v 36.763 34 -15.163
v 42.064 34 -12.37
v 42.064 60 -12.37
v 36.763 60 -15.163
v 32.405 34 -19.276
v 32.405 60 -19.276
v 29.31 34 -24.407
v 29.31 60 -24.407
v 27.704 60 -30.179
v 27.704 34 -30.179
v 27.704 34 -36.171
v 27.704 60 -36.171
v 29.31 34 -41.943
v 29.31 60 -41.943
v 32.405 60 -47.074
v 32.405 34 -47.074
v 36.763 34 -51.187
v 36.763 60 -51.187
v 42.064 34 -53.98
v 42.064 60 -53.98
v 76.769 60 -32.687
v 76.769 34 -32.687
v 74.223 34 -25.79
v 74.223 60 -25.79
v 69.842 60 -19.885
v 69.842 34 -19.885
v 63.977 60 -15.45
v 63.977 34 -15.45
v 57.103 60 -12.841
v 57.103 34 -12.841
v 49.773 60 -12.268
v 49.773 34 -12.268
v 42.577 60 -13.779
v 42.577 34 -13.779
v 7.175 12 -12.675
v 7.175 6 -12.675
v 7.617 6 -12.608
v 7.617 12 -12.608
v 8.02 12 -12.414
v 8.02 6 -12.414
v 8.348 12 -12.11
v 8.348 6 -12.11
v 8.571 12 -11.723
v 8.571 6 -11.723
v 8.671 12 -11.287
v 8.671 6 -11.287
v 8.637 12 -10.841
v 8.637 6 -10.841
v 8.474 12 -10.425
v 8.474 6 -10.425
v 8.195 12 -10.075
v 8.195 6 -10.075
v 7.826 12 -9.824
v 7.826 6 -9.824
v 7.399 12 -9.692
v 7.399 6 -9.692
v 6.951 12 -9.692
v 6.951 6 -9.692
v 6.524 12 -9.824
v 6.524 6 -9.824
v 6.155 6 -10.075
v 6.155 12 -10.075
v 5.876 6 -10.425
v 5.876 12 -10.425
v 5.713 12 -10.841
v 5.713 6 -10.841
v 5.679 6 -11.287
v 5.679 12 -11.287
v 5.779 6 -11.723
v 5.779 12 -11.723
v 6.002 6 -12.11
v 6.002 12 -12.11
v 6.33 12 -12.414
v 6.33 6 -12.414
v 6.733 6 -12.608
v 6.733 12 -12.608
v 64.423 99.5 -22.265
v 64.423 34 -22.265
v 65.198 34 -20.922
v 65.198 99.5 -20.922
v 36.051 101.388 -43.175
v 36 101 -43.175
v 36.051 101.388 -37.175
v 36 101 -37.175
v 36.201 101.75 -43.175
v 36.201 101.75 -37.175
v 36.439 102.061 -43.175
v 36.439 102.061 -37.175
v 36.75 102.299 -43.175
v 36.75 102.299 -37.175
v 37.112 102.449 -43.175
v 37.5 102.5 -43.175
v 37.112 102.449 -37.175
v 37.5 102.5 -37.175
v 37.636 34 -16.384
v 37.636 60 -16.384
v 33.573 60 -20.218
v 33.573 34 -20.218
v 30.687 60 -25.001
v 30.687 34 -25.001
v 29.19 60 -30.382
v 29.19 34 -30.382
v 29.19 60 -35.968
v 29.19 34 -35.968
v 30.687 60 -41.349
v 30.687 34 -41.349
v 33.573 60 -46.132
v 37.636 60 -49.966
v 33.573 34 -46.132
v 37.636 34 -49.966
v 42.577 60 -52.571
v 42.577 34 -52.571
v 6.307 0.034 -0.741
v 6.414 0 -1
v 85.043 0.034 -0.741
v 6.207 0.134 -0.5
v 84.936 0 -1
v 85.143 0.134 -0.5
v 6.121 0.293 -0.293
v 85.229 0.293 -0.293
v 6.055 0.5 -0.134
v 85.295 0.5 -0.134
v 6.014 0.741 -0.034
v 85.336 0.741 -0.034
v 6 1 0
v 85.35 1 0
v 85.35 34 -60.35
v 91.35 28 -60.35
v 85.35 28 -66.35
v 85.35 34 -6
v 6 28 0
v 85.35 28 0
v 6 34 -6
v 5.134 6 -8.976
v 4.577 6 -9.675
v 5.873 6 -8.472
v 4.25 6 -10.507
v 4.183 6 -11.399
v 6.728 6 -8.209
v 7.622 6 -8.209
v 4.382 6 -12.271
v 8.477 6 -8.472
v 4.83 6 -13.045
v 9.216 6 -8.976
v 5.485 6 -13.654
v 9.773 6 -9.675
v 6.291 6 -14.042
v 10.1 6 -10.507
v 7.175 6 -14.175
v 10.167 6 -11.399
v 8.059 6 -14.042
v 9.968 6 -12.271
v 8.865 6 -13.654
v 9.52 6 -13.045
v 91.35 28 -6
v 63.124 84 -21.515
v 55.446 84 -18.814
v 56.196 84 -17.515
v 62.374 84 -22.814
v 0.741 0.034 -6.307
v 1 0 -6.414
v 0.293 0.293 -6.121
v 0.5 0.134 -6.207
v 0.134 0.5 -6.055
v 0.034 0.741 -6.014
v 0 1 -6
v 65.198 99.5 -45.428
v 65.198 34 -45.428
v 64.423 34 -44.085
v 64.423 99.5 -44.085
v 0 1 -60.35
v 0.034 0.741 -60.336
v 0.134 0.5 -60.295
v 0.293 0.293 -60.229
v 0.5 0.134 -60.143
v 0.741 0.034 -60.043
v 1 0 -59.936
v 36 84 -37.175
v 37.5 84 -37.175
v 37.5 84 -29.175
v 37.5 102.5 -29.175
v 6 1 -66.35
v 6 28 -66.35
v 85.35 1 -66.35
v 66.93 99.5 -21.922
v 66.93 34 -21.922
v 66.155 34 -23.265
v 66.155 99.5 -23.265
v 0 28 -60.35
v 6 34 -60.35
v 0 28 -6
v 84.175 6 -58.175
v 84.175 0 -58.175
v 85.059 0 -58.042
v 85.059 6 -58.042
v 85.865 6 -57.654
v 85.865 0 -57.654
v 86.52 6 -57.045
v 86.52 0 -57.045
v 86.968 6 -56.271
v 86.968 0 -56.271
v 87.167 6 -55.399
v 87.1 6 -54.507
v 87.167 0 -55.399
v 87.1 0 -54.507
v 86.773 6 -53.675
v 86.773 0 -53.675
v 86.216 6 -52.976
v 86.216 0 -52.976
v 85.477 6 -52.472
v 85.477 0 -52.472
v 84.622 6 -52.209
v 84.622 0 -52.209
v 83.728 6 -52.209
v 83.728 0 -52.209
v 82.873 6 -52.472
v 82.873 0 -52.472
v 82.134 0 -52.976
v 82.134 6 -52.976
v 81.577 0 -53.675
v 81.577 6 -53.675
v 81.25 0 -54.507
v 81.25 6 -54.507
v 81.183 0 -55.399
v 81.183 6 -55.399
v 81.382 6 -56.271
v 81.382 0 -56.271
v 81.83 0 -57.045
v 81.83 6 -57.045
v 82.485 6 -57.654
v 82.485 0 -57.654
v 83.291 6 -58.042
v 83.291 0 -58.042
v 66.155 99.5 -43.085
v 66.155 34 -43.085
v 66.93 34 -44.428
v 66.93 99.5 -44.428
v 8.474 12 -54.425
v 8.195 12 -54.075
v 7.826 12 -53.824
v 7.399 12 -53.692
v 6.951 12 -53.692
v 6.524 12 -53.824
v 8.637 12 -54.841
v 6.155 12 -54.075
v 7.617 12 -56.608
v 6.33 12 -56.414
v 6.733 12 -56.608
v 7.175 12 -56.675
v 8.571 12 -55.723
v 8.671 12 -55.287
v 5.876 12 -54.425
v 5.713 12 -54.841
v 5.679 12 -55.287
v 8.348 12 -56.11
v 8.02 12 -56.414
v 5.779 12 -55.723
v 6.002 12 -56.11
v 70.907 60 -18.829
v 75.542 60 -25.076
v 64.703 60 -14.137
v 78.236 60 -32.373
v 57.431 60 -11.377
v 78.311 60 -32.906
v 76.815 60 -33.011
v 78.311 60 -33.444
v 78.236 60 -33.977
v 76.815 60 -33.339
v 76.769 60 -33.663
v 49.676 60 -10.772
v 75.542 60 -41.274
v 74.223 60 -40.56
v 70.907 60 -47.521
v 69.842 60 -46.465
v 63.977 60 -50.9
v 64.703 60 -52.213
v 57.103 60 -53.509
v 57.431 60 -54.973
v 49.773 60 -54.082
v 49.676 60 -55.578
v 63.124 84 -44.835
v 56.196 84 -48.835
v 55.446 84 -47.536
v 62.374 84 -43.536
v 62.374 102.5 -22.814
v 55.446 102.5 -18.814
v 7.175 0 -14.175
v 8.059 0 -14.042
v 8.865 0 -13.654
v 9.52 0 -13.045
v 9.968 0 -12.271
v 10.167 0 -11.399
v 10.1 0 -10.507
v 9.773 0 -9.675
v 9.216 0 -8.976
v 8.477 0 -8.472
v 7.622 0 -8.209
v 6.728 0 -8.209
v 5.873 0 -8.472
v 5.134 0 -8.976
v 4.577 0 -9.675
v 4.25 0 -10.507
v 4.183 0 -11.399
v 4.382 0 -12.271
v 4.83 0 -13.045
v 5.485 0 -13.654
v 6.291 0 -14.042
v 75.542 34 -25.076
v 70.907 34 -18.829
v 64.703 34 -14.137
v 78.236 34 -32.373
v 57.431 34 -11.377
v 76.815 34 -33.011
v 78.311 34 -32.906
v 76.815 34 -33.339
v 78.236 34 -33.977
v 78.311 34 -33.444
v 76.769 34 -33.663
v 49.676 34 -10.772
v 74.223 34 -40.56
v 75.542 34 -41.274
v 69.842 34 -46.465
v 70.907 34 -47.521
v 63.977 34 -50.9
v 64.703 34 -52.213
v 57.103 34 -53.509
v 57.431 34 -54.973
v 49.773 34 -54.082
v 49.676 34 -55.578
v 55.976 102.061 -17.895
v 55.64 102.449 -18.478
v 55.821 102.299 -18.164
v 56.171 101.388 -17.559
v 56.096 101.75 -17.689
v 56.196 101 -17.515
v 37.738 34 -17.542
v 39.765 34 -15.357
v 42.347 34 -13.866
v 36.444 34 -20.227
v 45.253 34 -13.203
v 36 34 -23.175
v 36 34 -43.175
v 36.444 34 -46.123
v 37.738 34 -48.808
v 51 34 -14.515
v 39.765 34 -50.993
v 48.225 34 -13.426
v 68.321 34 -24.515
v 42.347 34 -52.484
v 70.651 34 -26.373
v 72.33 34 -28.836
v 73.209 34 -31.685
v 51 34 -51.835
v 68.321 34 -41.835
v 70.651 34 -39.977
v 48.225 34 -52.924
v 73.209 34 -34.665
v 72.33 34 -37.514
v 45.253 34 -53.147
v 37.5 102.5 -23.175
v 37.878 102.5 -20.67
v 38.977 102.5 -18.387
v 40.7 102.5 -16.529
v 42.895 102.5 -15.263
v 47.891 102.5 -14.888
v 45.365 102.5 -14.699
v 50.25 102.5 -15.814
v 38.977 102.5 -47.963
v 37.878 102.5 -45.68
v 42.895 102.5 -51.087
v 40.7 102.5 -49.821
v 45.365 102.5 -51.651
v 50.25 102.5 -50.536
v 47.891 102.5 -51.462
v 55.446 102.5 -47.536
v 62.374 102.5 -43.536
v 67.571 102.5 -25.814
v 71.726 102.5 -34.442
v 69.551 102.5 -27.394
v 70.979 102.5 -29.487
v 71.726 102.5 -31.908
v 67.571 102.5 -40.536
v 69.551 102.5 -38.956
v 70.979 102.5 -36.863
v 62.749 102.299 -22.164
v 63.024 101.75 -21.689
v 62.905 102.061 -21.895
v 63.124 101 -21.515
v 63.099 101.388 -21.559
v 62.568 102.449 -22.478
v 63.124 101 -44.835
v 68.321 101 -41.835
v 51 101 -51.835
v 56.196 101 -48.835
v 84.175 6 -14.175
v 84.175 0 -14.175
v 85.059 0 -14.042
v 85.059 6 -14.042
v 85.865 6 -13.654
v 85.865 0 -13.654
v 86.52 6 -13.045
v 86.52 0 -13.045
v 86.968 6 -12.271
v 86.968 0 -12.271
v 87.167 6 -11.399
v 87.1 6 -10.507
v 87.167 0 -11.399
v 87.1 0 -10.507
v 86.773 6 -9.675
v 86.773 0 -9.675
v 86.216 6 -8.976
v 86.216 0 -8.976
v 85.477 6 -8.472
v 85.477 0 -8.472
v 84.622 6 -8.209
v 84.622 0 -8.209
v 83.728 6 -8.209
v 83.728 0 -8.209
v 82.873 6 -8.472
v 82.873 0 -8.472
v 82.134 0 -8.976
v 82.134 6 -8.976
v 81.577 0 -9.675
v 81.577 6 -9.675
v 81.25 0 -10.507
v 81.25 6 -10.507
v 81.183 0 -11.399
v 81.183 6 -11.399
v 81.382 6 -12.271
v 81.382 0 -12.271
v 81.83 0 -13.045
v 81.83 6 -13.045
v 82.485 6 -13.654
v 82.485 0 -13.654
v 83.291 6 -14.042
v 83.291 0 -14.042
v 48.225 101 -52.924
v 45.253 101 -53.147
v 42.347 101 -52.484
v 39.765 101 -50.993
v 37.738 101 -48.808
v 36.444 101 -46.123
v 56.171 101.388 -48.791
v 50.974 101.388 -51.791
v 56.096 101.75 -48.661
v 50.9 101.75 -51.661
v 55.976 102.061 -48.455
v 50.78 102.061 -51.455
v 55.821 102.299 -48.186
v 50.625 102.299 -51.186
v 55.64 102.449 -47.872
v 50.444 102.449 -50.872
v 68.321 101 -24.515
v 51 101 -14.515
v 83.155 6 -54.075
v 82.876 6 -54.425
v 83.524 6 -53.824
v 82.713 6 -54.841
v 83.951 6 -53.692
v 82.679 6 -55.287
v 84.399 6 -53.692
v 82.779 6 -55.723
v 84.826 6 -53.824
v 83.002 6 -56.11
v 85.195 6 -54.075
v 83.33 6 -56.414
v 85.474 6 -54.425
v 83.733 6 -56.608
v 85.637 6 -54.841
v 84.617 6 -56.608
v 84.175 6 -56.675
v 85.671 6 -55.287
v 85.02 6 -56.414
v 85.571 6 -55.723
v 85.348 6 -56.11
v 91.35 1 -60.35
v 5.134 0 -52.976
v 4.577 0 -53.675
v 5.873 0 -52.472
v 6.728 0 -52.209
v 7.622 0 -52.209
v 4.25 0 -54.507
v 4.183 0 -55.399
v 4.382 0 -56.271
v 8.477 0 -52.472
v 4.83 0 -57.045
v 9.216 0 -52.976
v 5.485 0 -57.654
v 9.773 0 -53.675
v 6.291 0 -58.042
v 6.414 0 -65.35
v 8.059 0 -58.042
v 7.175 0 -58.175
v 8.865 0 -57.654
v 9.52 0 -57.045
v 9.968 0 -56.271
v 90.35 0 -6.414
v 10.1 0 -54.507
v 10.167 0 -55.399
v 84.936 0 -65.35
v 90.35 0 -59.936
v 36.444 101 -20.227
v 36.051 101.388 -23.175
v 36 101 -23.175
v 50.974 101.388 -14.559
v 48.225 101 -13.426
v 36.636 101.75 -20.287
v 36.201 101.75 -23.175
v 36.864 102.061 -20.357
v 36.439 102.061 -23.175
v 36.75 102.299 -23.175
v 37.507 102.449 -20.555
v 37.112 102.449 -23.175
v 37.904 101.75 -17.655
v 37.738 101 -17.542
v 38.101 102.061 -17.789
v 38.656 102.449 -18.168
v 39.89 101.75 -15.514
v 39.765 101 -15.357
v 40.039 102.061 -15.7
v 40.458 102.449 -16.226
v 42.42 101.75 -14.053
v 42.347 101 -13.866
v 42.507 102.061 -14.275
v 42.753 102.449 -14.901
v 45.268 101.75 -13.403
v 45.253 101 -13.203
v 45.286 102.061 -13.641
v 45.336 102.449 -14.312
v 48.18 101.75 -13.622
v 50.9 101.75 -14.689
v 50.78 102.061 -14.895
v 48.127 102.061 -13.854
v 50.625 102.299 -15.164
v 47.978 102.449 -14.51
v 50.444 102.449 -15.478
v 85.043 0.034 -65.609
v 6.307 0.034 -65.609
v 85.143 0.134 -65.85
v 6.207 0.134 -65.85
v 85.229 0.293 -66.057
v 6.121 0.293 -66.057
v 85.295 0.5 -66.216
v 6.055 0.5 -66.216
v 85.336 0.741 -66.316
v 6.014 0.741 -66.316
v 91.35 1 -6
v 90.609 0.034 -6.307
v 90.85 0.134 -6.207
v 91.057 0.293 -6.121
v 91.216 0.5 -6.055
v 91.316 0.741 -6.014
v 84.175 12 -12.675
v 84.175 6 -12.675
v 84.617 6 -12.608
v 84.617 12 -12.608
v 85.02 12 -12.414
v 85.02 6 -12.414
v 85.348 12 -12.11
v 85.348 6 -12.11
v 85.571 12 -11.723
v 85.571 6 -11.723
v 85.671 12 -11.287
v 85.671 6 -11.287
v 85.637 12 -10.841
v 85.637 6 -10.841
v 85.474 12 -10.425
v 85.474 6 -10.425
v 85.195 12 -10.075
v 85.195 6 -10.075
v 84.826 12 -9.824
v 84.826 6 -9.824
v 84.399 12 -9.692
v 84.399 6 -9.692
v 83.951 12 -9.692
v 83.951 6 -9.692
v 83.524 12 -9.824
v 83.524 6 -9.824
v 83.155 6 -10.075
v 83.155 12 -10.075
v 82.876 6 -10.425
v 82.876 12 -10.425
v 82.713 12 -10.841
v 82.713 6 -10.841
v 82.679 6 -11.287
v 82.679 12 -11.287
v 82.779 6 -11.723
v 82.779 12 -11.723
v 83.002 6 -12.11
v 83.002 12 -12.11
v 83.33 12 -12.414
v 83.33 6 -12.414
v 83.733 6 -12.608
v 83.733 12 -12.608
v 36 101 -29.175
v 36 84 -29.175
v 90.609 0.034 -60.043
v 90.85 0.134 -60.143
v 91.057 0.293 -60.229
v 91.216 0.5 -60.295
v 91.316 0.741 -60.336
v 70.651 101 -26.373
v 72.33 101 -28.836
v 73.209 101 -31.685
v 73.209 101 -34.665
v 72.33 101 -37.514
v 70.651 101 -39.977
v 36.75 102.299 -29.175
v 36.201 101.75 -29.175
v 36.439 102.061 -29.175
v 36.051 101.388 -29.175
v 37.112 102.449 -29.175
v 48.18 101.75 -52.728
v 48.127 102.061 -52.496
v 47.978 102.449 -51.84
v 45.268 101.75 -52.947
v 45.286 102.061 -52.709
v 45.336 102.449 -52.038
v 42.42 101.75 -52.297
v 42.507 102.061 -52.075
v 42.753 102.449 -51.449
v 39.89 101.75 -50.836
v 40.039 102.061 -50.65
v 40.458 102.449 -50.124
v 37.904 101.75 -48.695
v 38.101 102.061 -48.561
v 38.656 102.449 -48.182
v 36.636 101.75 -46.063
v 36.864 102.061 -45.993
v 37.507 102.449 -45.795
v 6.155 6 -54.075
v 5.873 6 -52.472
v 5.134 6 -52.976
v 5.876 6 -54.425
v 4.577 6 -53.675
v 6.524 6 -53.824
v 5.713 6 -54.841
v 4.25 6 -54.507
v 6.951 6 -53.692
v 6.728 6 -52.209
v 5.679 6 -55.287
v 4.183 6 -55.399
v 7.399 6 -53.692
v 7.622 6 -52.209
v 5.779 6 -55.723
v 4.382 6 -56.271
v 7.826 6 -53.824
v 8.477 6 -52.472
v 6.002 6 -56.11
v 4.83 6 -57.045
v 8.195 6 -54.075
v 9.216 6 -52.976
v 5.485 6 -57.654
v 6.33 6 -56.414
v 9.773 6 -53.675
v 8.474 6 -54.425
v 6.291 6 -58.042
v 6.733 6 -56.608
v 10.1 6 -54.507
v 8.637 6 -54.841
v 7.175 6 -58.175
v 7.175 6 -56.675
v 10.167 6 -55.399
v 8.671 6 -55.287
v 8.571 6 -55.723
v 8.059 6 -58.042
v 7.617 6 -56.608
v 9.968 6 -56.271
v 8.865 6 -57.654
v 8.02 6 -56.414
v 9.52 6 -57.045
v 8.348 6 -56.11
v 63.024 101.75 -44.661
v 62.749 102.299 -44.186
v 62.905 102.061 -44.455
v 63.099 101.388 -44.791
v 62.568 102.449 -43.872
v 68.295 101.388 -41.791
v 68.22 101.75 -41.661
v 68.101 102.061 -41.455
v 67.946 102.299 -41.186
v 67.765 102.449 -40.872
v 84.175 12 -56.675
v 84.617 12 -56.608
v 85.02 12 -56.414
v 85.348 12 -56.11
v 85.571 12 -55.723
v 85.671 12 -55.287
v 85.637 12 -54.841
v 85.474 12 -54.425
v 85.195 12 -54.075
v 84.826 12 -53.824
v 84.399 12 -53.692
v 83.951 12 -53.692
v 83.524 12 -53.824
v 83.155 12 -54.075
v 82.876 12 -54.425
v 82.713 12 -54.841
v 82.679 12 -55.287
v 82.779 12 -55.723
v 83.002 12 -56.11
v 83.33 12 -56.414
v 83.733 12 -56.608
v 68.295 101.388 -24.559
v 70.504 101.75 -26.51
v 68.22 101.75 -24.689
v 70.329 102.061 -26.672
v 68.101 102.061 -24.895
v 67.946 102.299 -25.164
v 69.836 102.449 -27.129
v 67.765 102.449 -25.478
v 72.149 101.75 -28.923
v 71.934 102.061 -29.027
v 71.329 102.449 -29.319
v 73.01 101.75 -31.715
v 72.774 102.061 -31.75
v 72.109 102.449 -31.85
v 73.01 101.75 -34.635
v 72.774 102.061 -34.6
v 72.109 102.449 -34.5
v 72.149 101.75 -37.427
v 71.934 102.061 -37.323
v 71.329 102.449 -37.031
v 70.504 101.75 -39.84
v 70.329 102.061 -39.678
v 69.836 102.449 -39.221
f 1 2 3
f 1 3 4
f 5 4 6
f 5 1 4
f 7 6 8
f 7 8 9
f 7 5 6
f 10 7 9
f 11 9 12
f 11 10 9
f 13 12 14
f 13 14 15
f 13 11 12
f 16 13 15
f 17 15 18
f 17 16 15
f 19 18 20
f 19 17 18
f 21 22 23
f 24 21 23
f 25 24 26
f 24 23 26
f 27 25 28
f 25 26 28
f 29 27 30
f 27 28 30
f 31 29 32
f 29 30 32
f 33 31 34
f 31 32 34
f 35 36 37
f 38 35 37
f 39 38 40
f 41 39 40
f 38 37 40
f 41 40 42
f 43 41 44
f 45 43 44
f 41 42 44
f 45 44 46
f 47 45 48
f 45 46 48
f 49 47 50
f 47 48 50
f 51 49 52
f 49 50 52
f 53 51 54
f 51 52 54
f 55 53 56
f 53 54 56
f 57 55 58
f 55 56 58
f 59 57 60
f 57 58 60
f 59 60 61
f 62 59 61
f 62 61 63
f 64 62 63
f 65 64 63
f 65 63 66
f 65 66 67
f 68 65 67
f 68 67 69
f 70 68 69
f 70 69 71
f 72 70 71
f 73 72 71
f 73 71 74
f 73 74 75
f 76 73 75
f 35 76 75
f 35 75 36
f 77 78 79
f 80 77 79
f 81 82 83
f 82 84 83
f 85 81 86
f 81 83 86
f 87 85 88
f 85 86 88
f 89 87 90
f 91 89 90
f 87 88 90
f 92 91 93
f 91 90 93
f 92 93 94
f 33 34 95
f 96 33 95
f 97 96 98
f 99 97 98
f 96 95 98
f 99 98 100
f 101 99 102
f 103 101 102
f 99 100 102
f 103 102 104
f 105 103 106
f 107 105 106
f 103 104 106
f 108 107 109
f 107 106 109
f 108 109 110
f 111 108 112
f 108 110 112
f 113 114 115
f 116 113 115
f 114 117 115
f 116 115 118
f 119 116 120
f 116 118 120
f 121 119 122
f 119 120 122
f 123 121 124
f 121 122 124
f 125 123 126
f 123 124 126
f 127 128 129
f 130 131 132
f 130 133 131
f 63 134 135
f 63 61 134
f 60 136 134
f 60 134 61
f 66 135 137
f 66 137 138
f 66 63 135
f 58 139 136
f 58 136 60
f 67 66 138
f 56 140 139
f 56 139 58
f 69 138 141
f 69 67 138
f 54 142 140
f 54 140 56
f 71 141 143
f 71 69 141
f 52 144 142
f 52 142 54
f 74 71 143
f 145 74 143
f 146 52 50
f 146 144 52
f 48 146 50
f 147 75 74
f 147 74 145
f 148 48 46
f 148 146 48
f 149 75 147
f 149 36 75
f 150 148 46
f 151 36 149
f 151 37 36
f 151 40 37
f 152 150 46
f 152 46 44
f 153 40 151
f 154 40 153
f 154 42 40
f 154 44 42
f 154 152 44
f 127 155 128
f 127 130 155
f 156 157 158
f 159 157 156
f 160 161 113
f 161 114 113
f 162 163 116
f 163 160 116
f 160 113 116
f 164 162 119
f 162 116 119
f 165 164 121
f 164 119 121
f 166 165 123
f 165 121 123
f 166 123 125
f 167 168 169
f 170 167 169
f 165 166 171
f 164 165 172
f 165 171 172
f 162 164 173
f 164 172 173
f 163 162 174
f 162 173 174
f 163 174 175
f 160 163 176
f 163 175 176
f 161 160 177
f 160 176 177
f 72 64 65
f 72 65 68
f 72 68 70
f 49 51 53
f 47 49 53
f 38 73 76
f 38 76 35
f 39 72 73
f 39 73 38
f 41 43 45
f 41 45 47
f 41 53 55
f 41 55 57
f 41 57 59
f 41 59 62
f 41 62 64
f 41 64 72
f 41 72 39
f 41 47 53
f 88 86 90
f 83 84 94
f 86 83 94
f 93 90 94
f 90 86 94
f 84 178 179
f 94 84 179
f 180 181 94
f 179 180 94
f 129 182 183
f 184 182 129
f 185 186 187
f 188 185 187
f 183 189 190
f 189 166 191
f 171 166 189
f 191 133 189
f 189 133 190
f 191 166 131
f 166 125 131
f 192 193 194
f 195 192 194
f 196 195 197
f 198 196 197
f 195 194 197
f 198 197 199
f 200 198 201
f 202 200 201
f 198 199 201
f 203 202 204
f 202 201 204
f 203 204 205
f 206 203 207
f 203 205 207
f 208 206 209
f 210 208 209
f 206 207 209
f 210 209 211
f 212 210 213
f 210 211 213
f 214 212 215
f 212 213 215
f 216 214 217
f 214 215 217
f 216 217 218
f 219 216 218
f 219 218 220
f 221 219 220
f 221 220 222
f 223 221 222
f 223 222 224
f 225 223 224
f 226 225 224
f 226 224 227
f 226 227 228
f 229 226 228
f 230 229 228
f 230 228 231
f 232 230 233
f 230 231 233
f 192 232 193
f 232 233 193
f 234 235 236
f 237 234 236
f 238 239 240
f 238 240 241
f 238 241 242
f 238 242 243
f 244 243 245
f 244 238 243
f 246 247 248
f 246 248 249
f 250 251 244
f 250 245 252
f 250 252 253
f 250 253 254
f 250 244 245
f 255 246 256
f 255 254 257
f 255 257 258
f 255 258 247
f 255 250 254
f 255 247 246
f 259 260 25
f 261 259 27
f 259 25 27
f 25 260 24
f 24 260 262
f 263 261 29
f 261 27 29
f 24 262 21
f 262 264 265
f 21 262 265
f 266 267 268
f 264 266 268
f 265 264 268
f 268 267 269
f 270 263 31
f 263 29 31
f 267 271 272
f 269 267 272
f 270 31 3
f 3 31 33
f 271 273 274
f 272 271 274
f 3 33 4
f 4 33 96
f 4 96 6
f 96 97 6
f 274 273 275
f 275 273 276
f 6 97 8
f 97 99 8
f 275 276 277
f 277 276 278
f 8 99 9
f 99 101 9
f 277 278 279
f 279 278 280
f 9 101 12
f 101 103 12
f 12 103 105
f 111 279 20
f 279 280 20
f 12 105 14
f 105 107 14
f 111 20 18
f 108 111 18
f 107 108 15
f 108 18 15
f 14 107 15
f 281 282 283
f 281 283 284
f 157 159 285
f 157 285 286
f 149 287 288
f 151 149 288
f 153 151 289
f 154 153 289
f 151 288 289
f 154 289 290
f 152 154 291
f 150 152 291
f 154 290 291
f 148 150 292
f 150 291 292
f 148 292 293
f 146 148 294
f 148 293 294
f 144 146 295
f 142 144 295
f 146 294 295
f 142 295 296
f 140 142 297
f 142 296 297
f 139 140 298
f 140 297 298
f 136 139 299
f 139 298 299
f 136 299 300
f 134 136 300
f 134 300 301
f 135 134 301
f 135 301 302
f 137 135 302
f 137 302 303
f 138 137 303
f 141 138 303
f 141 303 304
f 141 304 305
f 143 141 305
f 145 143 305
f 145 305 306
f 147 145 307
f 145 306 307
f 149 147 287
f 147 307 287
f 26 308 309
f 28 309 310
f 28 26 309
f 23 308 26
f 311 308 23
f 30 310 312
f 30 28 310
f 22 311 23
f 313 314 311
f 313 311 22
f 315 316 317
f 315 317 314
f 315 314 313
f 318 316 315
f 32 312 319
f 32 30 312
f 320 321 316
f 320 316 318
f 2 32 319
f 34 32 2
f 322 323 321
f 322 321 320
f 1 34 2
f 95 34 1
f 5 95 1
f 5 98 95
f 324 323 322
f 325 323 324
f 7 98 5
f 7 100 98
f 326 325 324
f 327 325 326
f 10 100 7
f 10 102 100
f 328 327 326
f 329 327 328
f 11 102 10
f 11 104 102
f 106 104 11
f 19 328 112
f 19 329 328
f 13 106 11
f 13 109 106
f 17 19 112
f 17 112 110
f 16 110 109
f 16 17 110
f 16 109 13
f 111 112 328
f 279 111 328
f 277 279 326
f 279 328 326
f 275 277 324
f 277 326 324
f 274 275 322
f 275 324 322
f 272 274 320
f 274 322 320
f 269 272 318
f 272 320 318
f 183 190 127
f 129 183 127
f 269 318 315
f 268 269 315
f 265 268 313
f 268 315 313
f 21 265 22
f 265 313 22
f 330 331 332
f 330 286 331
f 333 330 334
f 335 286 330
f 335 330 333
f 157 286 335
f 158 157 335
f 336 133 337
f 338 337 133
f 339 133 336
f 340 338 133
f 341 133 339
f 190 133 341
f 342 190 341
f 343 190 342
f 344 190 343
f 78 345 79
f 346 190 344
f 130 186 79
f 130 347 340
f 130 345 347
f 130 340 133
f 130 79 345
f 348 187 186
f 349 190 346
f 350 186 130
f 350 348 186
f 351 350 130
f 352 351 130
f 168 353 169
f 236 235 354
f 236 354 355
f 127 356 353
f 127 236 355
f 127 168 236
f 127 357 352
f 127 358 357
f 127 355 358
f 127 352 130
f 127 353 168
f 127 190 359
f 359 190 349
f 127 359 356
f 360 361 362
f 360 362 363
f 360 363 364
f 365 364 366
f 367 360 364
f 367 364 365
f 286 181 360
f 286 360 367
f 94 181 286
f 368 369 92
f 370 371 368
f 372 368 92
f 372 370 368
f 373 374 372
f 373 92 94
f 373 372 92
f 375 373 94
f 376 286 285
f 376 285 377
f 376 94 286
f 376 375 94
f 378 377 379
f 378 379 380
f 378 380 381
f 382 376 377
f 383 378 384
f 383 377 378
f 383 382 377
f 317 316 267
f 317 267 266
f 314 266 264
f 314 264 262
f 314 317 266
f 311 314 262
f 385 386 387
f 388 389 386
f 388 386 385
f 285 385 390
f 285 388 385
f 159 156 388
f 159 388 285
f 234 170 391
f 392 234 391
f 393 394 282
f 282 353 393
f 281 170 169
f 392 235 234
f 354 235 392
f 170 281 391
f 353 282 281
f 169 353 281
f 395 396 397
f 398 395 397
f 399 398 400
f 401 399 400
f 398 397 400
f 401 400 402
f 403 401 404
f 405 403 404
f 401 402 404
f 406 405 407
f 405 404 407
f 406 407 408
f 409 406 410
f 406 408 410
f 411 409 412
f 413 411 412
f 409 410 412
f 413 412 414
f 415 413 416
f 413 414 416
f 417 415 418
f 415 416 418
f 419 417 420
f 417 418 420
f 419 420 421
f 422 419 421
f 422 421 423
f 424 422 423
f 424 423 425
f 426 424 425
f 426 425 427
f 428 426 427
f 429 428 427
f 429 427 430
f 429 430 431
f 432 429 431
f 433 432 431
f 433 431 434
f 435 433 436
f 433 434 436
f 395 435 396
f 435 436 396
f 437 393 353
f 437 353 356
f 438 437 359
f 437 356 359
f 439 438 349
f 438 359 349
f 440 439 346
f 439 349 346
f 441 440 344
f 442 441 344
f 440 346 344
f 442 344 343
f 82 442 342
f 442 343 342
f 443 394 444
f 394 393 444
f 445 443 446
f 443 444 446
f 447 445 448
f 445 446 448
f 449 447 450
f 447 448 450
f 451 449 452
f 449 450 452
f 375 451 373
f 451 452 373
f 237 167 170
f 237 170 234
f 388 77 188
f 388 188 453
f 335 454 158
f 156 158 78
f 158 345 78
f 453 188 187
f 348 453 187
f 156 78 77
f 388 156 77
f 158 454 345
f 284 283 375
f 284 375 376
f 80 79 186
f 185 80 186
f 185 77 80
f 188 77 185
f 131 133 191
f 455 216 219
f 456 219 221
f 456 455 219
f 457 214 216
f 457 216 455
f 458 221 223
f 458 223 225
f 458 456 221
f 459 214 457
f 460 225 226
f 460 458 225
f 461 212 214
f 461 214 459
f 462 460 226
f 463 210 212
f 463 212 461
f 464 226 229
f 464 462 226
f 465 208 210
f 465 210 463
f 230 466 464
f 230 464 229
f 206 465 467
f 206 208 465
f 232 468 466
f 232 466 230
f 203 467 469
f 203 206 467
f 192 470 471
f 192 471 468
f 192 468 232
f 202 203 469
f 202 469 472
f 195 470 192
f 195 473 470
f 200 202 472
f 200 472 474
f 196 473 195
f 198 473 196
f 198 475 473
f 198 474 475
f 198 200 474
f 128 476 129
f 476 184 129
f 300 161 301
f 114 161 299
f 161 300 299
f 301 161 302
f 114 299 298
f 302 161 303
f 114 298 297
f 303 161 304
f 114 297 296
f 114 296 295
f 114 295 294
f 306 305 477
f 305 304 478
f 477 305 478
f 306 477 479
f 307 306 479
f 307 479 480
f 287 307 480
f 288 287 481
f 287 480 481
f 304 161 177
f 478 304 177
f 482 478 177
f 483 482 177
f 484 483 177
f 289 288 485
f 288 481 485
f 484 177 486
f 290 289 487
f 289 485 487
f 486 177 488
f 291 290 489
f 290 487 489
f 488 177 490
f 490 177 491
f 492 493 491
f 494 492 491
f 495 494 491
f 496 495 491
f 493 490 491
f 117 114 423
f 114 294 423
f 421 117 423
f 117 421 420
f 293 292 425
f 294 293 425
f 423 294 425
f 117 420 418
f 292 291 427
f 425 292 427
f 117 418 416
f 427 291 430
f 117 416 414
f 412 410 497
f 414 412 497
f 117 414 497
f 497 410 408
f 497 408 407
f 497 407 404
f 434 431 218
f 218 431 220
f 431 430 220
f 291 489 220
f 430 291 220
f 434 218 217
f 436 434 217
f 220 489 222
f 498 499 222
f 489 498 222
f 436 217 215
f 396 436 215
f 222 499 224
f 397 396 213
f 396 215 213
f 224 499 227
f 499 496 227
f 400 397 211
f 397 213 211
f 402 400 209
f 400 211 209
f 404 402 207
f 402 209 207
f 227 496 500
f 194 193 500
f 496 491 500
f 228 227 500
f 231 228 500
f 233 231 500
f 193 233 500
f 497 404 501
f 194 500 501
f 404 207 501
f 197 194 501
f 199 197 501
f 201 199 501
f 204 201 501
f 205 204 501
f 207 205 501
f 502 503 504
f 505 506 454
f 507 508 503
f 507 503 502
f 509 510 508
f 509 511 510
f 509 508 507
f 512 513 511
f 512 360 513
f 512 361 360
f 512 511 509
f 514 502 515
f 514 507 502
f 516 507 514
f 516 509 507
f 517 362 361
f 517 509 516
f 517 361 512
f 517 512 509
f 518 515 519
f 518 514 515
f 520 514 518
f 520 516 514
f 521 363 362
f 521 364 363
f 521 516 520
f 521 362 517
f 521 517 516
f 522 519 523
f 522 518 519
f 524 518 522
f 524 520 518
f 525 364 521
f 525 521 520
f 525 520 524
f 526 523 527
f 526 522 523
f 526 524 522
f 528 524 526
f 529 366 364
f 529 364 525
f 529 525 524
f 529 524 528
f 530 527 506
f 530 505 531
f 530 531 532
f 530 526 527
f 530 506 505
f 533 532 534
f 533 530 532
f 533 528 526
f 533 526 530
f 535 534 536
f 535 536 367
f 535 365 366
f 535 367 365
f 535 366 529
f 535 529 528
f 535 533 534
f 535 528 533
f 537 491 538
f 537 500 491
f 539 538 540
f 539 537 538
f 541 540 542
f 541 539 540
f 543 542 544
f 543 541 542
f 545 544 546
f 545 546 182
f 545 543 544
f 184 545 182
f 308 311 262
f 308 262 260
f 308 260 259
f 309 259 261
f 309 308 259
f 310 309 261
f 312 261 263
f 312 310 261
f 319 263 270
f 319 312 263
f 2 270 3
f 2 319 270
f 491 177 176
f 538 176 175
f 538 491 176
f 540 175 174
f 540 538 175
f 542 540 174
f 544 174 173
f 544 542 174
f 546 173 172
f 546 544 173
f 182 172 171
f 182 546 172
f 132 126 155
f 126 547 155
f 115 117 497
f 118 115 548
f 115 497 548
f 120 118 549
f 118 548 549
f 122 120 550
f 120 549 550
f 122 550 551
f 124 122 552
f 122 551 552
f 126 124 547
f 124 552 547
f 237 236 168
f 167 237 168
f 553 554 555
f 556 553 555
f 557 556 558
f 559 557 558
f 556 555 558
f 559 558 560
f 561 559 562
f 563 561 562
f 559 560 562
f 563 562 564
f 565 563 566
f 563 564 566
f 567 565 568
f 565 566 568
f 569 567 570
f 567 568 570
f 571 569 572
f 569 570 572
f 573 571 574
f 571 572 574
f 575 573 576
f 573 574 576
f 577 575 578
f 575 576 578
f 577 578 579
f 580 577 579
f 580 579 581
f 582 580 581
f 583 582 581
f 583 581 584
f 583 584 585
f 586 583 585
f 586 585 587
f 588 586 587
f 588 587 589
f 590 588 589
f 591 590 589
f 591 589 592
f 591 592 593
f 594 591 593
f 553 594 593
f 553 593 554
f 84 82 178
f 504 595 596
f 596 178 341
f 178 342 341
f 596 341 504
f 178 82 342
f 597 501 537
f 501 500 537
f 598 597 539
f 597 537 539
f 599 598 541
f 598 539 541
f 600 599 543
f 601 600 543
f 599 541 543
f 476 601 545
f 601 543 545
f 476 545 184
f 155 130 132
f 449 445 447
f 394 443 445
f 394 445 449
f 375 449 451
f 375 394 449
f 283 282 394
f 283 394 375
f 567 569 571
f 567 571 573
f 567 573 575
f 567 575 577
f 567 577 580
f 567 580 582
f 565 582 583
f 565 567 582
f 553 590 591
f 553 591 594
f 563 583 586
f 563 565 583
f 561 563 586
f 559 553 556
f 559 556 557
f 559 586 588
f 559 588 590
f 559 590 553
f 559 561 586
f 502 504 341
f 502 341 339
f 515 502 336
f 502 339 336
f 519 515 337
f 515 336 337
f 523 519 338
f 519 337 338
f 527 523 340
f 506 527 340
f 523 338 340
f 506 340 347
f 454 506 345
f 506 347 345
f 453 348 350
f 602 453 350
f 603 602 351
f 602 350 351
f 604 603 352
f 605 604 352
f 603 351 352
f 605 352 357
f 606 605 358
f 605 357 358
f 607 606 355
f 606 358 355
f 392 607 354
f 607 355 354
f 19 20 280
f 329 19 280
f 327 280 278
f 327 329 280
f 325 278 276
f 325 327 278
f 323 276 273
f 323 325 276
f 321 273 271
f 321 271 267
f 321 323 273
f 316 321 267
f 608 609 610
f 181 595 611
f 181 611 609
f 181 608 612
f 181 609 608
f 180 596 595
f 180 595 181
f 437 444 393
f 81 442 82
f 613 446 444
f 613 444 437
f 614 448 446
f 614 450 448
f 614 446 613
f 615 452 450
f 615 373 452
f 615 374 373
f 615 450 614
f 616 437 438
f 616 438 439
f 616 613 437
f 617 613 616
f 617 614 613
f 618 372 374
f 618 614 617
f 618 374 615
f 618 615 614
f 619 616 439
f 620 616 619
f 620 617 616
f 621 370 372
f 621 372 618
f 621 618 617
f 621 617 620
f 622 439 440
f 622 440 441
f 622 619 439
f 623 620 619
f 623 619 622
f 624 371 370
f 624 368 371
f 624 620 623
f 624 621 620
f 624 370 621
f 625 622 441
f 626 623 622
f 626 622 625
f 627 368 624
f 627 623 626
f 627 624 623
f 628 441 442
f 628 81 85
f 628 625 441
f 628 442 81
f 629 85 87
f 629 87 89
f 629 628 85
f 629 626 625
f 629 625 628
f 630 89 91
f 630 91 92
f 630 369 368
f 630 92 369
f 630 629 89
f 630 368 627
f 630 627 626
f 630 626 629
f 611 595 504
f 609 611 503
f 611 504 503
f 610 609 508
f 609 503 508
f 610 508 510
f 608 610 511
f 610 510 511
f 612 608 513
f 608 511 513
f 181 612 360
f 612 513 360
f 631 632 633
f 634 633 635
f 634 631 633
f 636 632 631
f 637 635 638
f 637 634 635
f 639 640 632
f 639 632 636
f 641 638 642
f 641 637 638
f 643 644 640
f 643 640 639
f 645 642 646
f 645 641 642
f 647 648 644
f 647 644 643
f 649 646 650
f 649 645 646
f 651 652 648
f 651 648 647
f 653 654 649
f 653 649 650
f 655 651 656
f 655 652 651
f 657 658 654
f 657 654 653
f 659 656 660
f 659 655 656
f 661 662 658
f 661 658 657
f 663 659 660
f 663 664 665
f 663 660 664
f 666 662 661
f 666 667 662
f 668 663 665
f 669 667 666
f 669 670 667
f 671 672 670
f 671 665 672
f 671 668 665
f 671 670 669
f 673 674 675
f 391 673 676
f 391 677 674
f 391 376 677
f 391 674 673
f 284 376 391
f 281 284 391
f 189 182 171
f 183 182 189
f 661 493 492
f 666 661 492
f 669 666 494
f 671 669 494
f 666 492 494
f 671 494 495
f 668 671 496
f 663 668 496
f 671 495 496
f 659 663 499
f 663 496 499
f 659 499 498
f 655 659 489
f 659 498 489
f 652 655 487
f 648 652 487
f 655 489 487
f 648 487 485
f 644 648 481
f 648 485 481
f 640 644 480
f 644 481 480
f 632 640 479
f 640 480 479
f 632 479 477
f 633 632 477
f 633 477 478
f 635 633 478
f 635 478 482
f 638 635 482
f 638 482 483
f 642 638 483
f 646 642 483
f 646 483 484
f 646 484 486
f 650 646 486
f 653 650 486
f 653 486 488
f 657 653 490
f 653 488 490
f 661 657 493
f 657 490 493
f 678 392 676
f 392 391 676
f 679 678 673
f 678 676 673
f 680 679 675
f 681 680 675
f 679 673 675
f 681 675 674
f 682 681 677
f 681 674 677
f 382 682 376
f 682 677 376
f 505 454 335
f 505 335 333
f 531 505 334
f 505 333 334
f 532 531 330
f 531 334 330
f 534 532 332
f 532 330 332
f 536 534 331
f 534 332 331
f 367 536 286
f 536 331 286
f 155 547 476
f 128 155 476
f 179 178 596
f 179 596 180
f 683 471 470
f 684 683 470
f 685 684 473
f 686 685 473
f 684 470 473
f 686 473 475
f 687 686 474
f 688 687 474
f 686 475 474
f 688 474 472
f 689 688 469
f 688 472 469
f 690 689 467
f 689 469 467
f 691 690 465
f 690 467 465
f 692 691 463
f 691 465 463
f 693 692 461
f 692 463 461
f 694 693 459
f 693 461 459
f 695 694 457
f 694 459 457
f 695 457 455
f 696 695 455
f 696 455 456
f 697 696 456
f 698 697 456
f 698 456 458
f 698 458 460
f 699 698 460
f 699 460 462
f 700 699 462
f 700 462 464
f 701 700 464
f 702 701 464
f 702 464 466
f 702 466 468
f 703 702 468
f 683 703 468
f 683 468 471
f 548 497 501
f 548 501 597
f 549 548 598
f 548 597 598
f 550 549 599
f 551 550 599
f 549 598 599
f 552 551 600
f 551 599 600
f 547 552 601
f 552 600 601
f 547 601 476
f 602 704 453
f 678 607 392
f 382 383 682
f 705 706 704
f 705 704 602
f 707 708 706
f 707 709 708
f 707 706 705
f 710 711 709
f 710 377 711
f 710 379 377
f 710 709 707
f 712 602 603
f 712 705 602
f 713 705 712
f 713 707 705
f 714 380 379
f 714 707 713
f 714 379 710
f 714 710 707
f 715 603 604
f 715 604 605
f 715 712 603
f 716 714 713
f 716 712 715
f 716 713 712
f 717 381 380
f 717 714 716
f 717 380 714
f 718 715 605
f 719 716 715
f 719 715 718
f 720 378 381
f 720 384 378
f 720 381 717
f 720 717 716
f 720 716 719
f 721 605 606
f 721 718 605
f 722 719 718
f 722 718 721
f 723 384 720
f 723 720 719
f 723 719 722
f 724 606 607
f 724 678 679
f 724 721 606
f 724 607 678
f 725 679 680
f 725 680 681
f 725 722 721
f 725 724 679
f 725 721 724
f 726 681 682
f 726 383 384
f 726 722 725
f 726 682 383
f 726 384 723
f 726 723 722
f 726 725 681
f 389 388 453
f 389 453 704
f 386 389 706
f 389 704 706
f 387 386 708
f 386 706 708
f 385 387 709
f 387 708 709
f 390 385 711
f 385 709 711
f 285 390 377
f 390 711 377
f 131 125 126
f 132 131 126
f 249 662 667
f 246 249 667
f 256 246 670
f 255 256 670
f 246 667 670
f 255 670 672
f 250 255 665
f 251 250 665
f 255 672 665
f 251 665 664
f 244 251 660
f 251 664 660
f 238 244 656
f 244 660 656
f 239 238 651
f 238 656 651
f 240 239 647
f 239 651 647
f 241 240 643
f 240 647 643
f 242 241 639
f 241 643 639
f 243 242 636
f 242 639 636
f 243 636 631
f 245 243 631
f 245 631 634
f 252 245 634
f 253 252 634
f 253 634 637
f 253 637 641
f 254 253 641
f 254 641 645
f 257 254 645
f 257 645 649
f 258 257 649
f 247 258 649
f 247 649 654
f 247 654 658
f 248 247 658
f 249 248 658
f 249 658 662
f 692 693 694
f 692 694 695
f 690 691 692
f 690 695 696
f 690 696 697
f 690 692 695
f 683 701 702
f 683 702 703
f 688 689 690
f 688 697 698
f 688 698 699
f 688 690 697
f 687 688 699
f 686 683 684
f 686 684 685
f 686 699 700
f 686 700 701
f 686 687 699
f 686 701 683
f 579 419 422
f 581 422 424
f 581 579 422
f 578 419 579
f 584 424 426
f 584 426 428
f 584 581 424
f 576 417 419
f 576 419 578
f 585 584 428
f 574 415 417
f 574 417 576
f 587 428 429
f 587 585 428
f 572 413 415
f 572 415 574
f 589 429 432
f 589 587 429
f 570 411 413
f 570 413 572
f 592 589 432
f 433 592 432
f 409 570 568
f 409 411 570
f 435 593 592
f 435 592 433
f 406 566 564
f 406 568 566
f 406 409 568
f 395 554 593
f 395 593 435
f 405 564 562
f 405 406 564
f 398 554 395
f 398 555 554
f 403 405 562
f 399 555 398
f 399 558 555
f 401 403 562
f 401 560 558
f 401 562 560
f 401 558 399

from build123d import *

# Parameters (mm, degrees)
SKETCH1_W           = 91.35
SKETCH1_H           = 66.35
BOSS_EXTRUDE1_DEPTH = 34
CHAMFER1_SIZE       = 6
SKETCH2_R           = 3
SKETCH2_R_2         = 1.5
CUT_EXTRUDE1_DEPTH  = 6
SKETCH2_3_R         = 1.5
CUT_EXTRUDE2_DEPTH  = 12
FILLET1_R           = 1
BOSS_EXTRUDE3_START = 34
BOSS_EXTRUDE3_DEPTH = 68.5
CUT_EXTRUDE3_START  = 84
SKETCH1_6_W         = 1.5
SKETCH1_6_H         = 8
CUT_EXTRUDE3_DEPTH  = 18.5
BOSS_EXTRUDE4_START = 34
BOSS_EXTRUDE4_DEPTH = 65.5
FILLET2_R           = 1.5
BOSS_EXTRUDE6_START = 34
BOSS_EXTRUDE6_DEPTH = 26


with BuildPart() as part:
    # Sketch1 → Boss-Extrude1 (new body)
    with BuildSketch(Plane(origin=(0, 0, 0), x_dir=(1, 0, 0), z_dir=(0, 1, 0))):
        with Locations((45.675, 33.175)):
            Rectangle(SKETCH1_W, SKETCH1_H)
    extrude(amount=BOSS_EXTRUDE1_DEPTH)

    # Chamfer1
    chamfer1_edges = [part.edges().sort_by_distance(p)[0] for p in [
        (91.35, 34, -33.175),
        (45.675, 34, 0),
        (0, 34, -33.175),
        (0, 17, 0),
        (91.35, 17, 0),
        (91.35, 17, -66.35),
        (0, 17, -66.35),
        (45.675, 34, -66.35),
    ]]
    chamfer(chamfer1_edges, length=CHAMFER1_SIZE)

    # Sketch2 → Cut-Extrude1 (cut)
    # profile 1 of 4: a face of its own
    with BuildSketch(Plane(origin=(0, 0, 0), x_dir=(-1, 0, 0), z_dir=(0, -1, 0))):
        with Locations(Location((-7.175, 11.175, 0), (0, 0, 90))):
            Circle(SKETCH2_R)
        with Locations(Location((-7.175, 11.175, 0), (0, 0, 90))):
            Circle(SKETCH2_R_2, mode=Mode.SUBTRACT)
    # profile 2 of 4: a face of its own
    with BuildSketch(Plane(origin=(0, 0, 0), x_dir=(-1, 0, 0), z_dir=(0, -1, 0))):
        with Locations(Location((-84.175, 11.175, 0), (0, 0, 90))):
            Circle(SKETCH2_R)
        with Locations(Location((-84.175, 11.175, 0), (0, 0, 90))):
            Circle(SKETCH2_R_2, mode=Mode.SUBTRACT)
    # profile 3 of 4: a face of its own
    with BuildSketch(Plane(origin=(0, 0, 0), x_dir=(-1, 0, 0), z_dir=(0, -1, 0))):
        with Locations(Location((-7.175, 55.175, 0), (0, 0, 90))):
            Circle(SKETCH2_R)
        with Locations(Location((-7.175, 55.175, 0), (0, 0, 90))):
            Circle(SKETCH2_R_2, mode=Mode.SUBTRACT)
    # profile 4 of 4: a face of its own
    with BuildSketch(Plane(origin=(0, 0, 0), x_dir=(-1, 0, 0), z_dir=(0, -1, 0))):
        with Locations(Location((-84.175, 55.175, 0), (0, 0, 90))):
            Circle(SKETCH2_R)
        with Locations(Location((-84.175, 55.175, 0), (0, 0, 90))):
            Circle(SKETCH2_R_2, mode=Mode.SUBTRACT)
    extrude(amount=-CUT_EXTRUDE1_DEPTH, mode=Mode.SUBTRACT)

    # Sketch2<3> → Cut-Extrude2 (cut)
    with BuildSketch(Plane(origin=(0, 0, 0), x_dir=(-1, 0, 0), z_dir=(0, -1, 0))):
        with Locations(Location((-7.175, 11.175, 0), (0, 0, 90))):
            Circle(SKETCH2_3_R)
        with Locations(Location((-84.175, 11.175, 0), (0, 0, 90))):
            Circle(SKETCH2_3_R)
        with Locations(Location((-84.175, 55.175, 0), (0, 0, 90))):
            Circle(SKETCH2_3_R)
        with Locations(Location((-7.175, 55.175, 0), (0, 0, 90))):
            Circle(SKETCH2_3_R)
    extrude(amount=-CUT_EXTRUDE2_DEPTH, mode=Mode.SUBTRACT)

    # Fillet1
    fillet1_edges = [part.edges().sort_by_distance(p)[0] for p in [
        (45.675, 0, -66.35),
        (0, 0, -33.175),
        (91.35, 0, -33.175),
        (45.675, 0, 0),
        (3, 0, -3),
        (3, 0, -63.35),
        (88.35, 0, -3),
        (88.35, 0, -63.35),
    ]]
    fillet(fillet1_edges, radius=FILLET1_R)

    # Sketch1<5> → Boss-Extrude3 (add)
    with BuildSketch(Plane(origin=(0, 0, 0), x_dir=(1, 0, 0), z_dir=(0, 1, 0)).offset(BOSS_EXTRUDE3_START)):
        with BuildLine():
            Line((36, 43.175), (36, 23.175))
            ThreePointArc((36, 23.175), (41, 14.514745962), (51, 14.514745962))
            Line((51, 14.514745962), (68.320508076, 24.514745962))
            ThreePointArc((68.320508076, 24.514745962), (73.320508076, 33.175), (68.320508076, 41.835254038))
            Line((68.320508076, 41.835254038), (51, 51.835254038))
            ThreePointArc((51, 51.835254038), (41, 51.835254038), (36, 43.175))
        make_face()
    extrude(amount=BOSS_EXTRUDE3_DEPTH)

    # Sketch1<6> → Cut-Extrude3 (cut)
    with BuildSketch(Plane(origin=(0, 0, 0), x_dir=(1, 0, 0), z_dir=(0, 1, 0)).offset(CUT_EXTRUDE3_START)):
        Polygon((63.124355653, 44.835254038), (56.196152423, 48.835254038), (55.446152423, 47.536215932), (62.374355653, 43.536215932), align=None)
        Polygon((55.446152423, 18.813784068), (56.196152423, 17.514745962), (63.124355653, 21.514745962), (62.374355653, 22.813784068), align=None)
        with Locations((36.75, 33.175)):
            Rectangle(SKETCH1_6_W, SKETCH1_6_H)
    extrude(amount=CUT_EXTRUDE3_DEPTH, mode=Mode.SUBTRACT)

    # Sketch1<7> → Boss-Extrude4 (add)
    with BuildSketch(Plane(origin=(0, 0, 0), x_dir=(1, 0, 0), z_dir=(0, 1, 0)).offset(BOSS_EXTRUDE4_START)):
        Polygon((65.198393759, 45.427593414), (64.423393759, 44.085254038), (66.155444566, 43.085254038), (66.930444566, 44.427593414), align=None)
        Polygon((66.155444566, 23.264745962), (64.423393759, 22.264745962), (65.198393759, 20.922406586), (66.930444566, 21.922406586), align=None)
    extrude(amount=BOSS_EXTRUDE4_DEPTH)

    # Fillet2
    fillet2_edges = [part.edges().sort_by_distance(p)[0] for p in [
        (53.598076211, 102.5, -16.014745962),
        (36, 102.5, -26.175),
        (36, 102.5, -40.175),
        (53.598076211, 102.5, -50.335254038),
        (65.722431864, 102.5, -43.335254038),
        (65.722431864, 102.5, -23.014745962),
        (41, 102.5, -14.514745962),
        (41, 102.5, -51.835254038),
        (73.320508076, 102.5, -33.175),
    ]]
    fillet(fillet2_edges, radius=FILLET2_R)


with BuildPart() as body_2:
    # Sketch1<8> → Boss-Extrude6 (new body)
    with BuildSketch(Plane(origin=(0, 0, 0), x_dir=(1, 0, 0), z_dir=(0, 1, 0)).offset(BOSS_EXTRUDE6_START)):
        with BuildLine():
            ThreePointArc((42.063758389, 53.980369128), (64.703364915, 52.213077053), (78.235525618, 33.976966404))
            ThreePointArc((78.235525618, 33.976966404), (78.320508076, 33.175), (78.235525618, 32.373033596))
            ThreePointArc((78.235525618, 32.373033596), (64.703364915, 14.136922947), (42.063758389, 12.369630872))
            ThreePointArc((42.063758389, 12.369630872), (27.5, 33.175), (42.063758389, 53.980369128))
        make_face()
        with BuildLine():
            ThreePointArc((42.577181208, 52.570973154), (63.977453762, 50.900425919), (76.768838937, 33.662593726))
            ThreePointArc((76.768838937, 33.662593726), (76.820508076, 33.175), (76.768838937, 32.687406274))
            ThreePointArc((76.768838937, 32.687406274), (63.977453762, 15.449574081), (42.577181208, 13.779026846))
            ThreePointArc((42.577181208, 13.779026846), (29, 33.175), (42.577181208, 52.570973154))
        make_face(mode=Mode.SUBTRACT)
    extrude(amount=BOSS_EXTRUDE6_DEPTH)


solid = Compound([part.part, body_2.part])
